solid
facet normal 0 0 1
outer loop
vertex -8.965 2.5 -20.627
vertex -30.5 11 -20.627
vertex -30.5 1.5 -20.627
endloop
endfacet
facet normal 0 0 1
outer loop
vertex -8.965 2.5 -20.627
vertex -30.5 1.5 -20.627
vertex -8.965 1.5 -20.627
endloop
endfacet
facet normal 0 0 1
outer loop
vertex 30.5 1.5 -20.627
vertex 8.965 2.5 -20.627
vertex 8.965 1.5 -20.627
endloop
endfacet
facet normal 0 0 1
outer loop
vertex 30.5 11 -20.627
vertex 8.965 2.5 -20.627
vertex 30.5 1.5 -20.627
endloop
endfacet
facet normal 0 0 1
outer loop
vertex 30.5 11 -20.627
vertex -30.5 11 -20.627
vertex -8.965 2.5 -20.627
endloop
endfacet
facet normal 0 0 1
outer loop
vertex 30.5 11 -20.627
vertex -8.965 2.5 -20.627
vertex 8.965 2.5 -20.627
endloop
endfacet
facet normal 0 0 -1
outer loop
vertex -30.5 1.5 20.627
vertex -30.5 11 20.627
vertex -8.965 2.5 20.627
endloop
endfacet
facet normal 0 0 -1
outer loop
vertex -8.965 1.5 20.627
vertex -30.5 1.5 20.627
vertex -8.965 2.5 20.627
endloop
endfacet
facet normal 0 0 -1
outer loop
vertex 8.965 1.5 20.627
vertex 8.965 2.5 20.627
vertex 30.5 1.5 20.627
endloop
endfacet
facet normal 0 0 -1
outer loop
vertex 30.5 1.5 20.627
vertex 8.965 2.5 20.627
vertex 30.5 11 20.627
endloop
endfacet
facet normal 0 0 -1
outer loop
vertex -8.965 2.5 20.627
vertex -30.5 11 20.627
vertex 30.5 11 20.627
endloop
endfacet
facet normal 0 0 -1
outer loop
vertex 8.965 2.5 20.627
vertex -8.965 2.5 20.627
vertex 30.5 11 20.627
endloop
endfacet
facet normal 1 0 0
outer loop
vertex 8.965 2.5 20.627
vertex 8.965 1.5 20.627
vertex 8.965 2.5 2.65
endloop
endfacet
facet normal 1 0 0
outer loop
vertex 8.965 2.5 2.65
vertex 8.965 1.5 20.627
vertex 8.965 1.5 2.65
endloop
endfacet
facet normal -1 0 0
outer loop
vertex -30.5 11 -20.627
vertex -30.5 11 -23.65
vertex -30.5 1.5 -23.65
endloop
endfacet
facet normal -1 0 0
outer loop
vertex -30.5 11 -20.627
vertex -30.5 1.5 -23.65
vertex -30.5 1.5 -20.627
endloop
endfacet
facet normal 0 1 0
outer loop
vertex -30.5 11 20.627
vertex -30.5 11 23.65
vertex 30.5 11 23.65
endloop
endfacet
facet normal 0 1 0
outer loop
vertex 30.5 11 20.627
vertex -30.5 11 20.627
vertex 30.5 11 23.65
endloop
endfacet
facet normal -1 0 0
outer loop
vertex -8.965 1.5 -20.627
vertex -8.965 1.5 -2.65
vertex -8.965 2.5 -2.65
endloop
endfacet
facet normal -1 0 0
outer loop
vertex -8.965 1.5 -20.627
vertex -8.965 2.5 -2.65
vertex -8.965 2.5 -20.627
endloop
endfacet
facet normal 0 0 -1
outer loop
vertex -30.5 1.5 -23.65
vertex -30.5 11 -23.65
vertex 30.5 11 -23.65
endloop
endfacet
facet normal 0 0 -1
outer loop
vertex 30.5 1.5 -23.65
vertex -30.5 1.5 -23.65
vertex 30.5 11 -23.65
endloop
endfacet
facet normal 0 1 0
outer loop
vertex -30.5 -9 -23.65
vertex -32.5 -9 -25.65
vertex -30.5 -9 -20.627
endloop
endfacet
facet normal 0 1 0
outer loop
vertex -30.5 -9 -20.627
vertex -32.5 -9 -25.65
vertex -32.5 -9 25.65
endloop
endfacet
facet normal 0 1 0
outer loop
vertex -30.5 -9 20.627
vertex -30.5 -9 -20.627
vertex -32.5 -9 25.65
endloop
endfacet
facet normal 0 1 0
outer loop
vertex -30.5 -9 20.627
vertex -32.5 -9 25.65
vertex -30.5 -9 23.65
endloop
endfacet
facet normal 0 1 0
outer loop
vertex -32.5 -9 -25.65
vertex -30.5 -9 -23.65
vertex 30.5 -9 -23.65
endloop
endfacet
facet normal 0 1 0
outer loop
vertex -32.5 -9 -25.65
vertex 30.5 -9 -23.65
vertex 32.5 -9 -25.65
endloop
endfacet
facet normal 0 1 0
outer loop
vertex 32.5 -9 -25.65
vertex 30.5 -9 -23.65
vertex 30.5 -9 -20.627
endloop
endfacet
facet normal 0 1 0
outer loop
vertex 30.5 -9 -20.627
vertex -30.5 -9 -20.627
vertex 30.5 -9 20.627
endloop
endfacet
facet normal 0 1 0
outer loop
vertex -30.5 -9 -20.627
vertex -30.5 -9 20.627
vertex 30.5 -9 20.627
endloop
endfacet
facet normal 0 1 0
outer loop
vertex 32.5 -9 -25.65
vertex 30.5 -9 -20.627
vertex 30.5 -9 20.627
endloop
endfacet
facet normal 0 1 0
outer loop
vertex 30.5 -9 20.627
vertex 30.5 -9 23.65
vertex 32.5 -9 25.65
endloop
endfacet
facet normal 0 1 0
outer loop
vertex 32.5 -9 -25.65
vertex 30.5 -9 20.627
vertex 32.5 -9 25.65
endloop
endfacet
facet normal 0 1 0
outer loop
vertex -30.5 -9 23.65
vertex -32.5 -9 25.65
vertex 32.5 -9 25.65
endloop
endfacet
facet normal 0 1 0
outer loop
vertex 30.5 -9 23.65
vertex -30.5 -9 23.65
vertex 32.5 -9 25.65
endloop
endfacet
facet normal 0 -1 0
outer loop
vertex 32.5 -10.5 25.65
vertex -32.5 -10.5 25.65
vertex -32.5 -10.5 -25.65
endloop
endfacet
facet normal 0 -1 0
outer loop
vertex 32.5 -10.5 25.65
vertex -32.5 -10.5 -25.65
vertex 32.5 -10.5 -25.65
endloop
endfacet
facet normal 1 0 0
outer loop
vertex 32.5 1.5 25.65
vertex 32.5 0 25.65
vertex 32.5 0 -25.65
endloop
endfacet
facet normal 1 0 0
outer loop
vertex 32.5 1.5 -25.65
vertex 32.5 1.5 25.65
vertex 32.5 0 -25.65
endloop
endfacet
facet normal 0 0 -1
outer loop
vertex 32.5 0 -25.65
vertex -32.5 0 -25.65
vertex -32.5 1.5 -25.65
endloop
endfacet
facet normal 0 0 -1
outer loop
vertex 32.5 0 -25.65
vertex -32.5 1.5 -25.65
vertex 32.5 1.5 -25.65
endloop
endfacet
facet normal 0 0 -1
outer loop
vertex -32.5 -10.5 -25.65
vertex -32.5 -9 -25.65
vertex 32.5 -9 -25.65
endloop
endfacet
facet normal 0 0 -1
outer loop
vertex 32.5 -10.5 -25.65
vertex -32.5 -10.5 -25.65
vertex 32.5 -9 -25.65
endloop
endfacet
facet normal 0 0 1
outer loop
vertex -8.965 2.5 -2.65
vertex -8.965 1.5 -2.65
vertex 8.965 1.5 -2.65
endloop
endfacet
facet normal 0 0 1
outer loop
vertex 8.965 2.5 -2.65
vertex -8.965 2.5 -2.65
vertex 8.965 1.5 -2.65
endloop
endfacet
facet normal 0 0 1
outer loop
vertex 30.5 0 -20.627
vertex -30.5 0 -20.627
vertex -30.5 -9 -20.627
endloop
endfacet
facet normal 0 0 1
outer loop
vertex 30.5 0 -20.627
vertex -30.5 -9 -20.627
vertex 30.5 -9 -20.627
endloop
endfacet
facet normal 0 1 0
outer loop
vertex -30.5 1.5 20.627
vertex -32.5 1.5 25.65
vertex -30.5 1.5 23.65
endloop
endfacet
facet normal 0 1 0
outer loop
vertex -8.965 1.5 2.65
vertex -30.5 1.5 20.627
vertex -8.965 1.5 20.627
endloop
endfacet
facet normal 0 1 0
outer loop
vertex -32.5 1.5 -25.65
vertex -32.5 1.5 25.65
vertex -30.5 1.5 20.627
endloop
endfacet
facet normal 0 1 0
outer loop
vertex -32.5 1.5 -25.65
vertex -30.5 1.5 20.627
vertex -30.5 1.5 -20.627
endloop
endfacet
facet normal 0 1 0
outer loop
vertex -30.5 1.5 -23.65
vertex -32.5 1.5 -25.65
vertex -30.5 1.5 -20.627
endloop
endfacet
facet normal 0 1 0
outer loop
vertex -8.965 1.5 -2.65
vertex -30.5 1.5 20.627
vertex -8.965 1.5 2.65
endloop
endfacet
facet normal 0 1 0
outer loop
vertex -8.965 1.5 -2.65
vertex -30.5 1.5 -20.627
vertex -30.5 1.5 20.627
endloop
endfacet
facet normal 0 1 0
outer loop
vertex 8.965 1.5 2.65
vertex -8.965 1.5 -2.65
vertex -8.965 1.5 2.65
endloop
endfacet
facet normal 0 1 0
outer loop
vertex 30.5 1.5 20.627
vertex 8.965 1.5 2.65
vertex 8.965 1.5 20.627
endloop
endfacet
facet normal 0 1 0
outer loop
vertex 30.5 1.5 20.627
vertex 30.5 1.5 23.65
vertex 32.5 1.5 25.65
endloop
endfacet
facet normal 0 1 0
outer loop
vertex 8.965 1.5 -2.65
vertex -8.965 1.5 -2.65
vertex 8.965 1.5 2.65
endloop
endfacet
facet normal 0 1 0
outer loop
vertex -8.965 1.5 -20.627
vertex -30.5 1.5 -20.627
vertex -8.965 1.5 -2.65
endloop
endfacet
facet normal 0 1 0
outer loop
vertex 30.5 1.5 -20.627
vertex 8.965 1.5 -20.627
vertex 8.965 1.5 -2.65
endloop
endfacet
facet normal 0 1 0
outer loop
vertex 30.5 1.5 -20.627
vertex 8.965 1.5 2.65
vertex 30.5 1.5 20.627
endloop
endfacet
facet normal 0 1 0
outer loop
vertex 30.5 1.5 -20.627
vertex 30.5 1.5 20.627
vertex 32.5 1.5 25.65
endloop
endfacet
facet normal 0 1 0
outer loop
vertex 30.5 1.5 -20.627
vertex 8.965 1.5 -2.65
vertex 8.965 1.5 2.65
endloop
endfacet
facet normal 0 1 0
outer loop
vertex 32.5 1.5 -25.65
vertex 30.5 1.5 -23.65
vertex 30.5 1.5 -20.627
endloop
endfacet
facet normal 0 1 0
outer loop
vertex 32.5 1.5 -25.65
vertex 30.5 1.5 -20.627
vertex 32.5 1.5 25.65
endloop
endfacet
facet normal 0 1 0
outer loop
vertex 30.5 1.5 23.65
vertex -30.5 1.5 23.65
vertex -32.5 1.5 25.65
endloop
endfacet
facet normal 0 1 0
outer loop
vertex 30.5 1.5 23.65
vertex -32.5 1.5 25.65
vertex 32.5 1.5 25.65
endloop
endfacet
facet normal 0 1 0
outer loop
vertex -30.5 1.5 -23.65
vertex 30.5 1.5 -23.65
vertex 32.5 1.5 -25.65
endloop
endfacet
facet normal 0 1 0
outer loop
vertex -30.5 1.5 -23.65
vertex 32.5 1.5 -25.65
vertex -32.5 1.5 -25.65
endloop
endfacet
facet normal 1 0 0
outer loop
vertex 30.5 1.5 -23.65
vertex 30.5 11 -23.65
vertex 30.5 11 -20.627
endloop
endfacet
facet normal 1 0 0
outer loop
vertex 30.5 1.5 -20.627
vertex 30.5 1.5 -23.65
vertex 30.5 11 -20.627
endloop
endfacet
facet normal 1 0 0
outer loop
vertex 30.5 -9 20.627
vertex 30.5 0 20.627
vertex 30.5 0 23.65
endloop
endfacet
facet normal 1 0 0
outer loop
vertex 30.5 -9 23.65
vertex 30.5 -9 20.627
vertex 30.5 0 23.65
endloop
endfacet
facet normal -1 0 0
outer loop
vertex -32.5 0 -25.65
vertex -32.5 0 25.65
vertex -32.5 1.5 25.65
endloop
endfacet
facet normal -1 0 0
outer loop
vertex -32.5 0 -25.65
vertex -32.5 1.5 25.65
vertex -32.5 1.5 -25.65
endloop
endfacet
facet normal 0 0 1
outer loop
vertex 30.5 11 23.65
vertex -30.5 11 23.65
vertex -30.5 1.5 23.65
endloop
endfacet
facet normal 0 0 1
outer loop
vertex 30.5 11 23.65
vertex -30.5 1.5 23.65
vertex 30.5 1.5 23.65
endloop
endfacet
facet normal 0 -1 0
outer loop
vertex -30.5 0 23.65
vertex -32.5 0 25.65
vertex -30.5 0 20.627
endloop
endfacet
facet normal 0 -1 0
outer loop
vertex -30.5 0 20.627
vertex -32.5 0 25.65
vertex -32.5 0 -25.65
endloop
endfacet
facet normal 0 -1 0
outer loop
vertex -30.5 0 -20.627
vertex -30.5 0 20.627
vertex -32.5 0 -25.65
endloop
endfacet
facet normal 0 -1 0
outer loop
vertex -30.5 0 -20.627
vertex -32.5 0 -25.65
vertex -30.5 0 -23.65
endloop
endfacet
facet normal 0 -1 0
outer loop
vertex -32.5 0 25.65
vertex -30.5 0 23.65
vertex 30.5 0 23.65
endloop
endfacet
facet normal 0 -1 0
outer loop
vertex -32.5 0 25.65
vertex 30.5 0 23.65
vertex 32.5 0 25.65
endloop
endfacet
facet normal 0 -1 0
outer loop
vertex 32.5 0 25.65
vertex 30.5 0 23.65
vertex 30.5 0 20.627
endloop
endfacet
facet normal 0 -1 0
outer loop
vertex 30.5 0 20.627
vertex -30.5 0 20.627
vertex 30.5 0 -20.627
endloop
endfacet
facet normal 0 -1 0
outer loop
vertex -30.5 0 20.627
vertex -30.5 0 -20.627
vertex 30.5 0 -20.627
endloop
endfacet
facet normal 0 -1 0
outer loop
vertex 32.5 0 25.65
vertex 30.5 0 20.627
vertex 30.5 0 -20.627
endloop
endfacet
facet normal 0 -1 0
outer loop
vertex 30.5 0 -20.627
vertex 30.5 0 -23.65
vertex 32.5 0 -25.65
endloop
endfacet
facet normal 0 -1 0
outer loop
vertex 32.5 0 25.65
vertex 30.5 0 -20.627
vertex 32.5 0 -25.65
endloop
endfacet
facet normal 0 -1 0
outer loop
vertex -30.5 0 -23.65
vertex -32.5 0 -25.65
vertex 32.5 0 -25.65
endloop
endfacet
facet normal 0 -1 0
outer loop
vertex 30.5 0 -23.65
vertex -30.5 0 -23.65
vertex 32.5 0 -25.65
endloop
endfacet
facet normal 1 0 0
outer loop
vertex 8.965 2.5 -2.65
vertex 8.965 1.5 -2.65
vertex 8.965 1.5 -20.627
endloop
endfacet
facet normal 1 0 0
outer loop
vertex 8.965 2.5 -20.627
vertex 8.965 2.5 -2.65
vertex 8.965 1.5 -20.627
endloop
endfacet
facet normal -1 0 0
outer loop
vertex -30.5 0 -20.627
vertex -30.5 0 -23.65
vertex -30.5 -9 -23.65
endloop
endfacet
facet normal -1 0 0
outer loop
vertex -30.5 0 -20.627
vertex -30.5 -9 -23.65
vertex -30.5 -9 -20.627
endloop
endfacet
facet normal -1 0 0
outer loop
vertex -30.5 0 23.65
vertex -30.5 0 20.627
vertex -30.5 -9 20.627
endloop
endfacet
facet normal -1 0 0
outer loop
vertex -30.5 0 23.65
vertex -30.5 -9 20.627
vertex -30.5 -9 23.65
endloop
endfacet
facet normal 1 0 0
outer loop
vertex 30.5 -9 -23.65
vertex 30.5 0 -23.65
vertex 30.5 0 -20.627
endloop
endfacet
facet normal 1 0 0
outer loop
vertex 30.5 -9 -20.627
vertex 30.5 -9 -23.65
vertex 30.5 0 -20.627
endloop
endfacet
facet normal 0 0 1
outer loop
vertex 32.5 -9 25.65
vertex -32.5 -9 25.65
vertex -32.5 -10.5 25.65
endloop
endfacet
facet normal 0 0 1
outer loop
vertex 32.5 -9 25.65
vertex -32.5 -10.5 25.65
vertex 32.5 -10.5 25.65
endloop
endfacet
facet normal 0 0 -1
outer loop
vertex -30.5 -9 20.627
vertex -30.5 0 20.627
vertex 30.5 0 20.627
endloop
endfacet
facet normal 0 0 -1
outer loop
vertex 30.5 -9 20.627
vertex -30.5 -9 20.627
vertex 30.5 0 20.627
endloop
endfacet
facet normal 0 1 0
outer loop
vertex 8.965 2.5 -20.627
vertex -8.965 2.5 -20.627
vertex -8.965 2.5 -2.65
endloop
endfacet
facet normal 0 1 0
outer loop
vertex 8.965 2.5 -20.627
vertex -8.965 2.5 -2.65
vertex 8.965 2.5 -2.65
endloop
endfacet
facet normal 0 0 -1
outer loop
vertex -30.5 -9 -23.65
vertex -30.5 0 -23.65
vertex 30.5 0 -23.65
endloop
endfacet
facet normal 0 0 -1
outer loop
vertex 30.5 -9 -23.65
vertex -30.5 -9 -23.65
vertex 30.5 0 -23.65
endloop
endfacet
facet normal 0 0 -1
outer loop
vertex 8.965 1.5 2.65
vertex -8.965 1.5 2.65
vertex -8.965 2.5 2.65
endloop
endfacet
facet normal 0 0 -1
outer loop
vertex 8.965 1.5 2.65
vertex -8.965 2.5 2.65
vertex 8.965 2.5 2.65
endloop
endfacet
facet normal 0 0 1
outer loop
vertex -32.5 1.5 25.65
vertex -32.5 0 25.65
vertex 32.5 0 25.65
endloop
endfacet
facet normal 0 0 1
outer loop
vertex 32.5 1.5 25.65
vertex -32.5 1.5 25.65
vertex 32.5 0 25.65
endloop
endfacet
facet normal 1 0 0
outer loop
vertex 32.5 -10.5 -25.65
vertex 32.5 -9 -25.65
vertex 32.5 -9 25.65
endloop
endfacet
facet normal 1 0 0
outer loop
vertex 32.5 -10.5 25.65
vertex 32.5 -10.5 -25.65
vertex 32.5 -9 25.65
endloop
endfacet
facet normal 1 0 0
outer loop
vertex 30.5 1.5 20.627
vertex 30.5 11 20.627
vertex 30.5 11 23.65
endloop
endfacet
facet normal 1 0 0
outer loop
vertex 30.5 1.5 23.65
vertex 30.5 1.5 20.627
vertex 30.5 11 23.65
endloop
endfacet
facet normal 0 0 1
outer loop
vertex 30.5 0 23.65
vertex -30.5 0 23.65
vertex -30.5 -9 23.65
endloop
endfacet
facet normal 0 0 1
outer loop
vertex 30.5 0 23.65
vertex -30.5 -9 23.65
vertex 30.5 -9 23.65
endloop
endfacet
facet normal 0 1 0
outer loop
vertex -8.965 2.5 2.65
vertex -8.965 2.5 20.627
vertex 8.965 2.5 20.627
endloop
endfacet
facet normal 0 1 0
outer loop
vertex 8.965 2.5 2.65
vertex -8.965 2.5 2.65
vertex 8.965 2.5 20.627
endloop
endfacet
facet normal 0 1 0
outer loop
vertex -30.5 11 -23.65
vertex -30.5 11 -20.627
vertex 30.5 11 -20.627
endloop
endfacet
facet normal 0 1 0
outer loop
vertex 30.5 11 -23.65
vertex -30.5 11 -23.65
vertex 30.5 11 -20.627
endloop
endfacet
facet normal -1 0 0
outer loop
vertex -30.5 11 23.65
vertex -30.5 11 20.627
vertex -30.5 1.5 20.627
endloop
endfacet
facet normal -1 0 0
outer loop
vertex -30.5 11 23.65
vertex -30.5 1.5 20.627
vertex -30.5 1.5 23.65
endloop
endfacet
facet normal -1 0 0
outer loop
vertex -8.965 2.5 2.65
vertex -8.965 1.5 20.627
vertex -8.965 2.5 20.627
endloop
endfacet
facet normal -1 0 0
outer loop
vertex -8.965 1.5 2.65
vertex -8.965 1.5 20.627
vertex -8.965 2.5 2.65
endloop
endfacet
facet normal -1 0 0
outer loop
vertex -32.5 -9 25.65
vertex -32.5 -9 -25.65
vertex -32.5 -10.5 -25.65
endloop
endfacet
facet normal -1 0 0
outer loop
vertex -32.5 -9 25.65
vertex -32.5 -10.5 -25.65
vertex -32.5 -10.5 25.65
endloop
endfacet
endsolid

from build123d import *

# Parameters (mm, degrees)
SKETCH1_W                = 65
SKETCH1_H                = 51.3
BOSS_EXTRUDE1_DEPTH      = 1.5
SKETCH2_W                = 17.929597568
SKETCH2_H                = 18
BOSS_EXTRUDE2_DEPTH      = 1
BOSS_EXTRUDE3_DEPTH      = 9
BOSS_EXTRUDE3_DEPTH_BACK = 11
SKETCH4_W                = 61
SKETCH4_H                = 3.022614149
SKETCH5_W                = 65
SKETCH5_H                = 51.3
BOSS_EXTRUDE4_DEPTH      = 1.5


with BuildPart() as part:
    # Sketch1 → Boss-Extrude1 (new body)
    with BuildSketch(Plane(origin=(0, 0, 0), x_dir=(1, 0, 0), z_dir=(0, 1, 0))):
        Rectangle(SKETCH1_W, SKETCH1_H)
    extrude(amount=BOSS_EXTRUDE1_DEPTH)

    # Sketch2 → Boss-Extrude2 (add)
    with BuildSketch(Plane(origin=(0, 1.5, 0), x_dir=(1, 0, 0), z_dir=(0, 1, 0))):
        with Locations((0, 11.65)):
            Rectangle(SKETCH2_W, SKETCH2_H)
        with Locations((0, -11.65)):
            Rectangle(SKETCH2_W, SKETCH2_H)
    extrude(amount=BOSS_EXTRUDE2_DEPTH)

    # Sketch4 → Boss-Extrude3 (add, two sides: drawn at the far end of the back side and taken through both)
    with BuildSketch(Plane.XZ.offset(-BOSS_EXTRUDE3_DEPTH_BACK)):
        with Locations((0, 22.138692926)):
            Rectangle(SKETCH4_W, SKETCH4_H)
        with Locations((0, -22.138692926)):
            Rectangle(SKETCH4_W, SKETCH4_H)
    extrude(amount=BOSS_EXTRUDE3_DEPTH + BOSS_EXTRUDE3_DEPTH_BACK)

    # Sketch5 → Boss-Extrude4 (add)
    with BuildSketch(Plane.XZ.offset(9)):
        Rectangle(SKETCH5_W, SKETCH5_H)
    extrude(amount=BOSS_EXTRUDE4_DEPTH)


solid = part.part
